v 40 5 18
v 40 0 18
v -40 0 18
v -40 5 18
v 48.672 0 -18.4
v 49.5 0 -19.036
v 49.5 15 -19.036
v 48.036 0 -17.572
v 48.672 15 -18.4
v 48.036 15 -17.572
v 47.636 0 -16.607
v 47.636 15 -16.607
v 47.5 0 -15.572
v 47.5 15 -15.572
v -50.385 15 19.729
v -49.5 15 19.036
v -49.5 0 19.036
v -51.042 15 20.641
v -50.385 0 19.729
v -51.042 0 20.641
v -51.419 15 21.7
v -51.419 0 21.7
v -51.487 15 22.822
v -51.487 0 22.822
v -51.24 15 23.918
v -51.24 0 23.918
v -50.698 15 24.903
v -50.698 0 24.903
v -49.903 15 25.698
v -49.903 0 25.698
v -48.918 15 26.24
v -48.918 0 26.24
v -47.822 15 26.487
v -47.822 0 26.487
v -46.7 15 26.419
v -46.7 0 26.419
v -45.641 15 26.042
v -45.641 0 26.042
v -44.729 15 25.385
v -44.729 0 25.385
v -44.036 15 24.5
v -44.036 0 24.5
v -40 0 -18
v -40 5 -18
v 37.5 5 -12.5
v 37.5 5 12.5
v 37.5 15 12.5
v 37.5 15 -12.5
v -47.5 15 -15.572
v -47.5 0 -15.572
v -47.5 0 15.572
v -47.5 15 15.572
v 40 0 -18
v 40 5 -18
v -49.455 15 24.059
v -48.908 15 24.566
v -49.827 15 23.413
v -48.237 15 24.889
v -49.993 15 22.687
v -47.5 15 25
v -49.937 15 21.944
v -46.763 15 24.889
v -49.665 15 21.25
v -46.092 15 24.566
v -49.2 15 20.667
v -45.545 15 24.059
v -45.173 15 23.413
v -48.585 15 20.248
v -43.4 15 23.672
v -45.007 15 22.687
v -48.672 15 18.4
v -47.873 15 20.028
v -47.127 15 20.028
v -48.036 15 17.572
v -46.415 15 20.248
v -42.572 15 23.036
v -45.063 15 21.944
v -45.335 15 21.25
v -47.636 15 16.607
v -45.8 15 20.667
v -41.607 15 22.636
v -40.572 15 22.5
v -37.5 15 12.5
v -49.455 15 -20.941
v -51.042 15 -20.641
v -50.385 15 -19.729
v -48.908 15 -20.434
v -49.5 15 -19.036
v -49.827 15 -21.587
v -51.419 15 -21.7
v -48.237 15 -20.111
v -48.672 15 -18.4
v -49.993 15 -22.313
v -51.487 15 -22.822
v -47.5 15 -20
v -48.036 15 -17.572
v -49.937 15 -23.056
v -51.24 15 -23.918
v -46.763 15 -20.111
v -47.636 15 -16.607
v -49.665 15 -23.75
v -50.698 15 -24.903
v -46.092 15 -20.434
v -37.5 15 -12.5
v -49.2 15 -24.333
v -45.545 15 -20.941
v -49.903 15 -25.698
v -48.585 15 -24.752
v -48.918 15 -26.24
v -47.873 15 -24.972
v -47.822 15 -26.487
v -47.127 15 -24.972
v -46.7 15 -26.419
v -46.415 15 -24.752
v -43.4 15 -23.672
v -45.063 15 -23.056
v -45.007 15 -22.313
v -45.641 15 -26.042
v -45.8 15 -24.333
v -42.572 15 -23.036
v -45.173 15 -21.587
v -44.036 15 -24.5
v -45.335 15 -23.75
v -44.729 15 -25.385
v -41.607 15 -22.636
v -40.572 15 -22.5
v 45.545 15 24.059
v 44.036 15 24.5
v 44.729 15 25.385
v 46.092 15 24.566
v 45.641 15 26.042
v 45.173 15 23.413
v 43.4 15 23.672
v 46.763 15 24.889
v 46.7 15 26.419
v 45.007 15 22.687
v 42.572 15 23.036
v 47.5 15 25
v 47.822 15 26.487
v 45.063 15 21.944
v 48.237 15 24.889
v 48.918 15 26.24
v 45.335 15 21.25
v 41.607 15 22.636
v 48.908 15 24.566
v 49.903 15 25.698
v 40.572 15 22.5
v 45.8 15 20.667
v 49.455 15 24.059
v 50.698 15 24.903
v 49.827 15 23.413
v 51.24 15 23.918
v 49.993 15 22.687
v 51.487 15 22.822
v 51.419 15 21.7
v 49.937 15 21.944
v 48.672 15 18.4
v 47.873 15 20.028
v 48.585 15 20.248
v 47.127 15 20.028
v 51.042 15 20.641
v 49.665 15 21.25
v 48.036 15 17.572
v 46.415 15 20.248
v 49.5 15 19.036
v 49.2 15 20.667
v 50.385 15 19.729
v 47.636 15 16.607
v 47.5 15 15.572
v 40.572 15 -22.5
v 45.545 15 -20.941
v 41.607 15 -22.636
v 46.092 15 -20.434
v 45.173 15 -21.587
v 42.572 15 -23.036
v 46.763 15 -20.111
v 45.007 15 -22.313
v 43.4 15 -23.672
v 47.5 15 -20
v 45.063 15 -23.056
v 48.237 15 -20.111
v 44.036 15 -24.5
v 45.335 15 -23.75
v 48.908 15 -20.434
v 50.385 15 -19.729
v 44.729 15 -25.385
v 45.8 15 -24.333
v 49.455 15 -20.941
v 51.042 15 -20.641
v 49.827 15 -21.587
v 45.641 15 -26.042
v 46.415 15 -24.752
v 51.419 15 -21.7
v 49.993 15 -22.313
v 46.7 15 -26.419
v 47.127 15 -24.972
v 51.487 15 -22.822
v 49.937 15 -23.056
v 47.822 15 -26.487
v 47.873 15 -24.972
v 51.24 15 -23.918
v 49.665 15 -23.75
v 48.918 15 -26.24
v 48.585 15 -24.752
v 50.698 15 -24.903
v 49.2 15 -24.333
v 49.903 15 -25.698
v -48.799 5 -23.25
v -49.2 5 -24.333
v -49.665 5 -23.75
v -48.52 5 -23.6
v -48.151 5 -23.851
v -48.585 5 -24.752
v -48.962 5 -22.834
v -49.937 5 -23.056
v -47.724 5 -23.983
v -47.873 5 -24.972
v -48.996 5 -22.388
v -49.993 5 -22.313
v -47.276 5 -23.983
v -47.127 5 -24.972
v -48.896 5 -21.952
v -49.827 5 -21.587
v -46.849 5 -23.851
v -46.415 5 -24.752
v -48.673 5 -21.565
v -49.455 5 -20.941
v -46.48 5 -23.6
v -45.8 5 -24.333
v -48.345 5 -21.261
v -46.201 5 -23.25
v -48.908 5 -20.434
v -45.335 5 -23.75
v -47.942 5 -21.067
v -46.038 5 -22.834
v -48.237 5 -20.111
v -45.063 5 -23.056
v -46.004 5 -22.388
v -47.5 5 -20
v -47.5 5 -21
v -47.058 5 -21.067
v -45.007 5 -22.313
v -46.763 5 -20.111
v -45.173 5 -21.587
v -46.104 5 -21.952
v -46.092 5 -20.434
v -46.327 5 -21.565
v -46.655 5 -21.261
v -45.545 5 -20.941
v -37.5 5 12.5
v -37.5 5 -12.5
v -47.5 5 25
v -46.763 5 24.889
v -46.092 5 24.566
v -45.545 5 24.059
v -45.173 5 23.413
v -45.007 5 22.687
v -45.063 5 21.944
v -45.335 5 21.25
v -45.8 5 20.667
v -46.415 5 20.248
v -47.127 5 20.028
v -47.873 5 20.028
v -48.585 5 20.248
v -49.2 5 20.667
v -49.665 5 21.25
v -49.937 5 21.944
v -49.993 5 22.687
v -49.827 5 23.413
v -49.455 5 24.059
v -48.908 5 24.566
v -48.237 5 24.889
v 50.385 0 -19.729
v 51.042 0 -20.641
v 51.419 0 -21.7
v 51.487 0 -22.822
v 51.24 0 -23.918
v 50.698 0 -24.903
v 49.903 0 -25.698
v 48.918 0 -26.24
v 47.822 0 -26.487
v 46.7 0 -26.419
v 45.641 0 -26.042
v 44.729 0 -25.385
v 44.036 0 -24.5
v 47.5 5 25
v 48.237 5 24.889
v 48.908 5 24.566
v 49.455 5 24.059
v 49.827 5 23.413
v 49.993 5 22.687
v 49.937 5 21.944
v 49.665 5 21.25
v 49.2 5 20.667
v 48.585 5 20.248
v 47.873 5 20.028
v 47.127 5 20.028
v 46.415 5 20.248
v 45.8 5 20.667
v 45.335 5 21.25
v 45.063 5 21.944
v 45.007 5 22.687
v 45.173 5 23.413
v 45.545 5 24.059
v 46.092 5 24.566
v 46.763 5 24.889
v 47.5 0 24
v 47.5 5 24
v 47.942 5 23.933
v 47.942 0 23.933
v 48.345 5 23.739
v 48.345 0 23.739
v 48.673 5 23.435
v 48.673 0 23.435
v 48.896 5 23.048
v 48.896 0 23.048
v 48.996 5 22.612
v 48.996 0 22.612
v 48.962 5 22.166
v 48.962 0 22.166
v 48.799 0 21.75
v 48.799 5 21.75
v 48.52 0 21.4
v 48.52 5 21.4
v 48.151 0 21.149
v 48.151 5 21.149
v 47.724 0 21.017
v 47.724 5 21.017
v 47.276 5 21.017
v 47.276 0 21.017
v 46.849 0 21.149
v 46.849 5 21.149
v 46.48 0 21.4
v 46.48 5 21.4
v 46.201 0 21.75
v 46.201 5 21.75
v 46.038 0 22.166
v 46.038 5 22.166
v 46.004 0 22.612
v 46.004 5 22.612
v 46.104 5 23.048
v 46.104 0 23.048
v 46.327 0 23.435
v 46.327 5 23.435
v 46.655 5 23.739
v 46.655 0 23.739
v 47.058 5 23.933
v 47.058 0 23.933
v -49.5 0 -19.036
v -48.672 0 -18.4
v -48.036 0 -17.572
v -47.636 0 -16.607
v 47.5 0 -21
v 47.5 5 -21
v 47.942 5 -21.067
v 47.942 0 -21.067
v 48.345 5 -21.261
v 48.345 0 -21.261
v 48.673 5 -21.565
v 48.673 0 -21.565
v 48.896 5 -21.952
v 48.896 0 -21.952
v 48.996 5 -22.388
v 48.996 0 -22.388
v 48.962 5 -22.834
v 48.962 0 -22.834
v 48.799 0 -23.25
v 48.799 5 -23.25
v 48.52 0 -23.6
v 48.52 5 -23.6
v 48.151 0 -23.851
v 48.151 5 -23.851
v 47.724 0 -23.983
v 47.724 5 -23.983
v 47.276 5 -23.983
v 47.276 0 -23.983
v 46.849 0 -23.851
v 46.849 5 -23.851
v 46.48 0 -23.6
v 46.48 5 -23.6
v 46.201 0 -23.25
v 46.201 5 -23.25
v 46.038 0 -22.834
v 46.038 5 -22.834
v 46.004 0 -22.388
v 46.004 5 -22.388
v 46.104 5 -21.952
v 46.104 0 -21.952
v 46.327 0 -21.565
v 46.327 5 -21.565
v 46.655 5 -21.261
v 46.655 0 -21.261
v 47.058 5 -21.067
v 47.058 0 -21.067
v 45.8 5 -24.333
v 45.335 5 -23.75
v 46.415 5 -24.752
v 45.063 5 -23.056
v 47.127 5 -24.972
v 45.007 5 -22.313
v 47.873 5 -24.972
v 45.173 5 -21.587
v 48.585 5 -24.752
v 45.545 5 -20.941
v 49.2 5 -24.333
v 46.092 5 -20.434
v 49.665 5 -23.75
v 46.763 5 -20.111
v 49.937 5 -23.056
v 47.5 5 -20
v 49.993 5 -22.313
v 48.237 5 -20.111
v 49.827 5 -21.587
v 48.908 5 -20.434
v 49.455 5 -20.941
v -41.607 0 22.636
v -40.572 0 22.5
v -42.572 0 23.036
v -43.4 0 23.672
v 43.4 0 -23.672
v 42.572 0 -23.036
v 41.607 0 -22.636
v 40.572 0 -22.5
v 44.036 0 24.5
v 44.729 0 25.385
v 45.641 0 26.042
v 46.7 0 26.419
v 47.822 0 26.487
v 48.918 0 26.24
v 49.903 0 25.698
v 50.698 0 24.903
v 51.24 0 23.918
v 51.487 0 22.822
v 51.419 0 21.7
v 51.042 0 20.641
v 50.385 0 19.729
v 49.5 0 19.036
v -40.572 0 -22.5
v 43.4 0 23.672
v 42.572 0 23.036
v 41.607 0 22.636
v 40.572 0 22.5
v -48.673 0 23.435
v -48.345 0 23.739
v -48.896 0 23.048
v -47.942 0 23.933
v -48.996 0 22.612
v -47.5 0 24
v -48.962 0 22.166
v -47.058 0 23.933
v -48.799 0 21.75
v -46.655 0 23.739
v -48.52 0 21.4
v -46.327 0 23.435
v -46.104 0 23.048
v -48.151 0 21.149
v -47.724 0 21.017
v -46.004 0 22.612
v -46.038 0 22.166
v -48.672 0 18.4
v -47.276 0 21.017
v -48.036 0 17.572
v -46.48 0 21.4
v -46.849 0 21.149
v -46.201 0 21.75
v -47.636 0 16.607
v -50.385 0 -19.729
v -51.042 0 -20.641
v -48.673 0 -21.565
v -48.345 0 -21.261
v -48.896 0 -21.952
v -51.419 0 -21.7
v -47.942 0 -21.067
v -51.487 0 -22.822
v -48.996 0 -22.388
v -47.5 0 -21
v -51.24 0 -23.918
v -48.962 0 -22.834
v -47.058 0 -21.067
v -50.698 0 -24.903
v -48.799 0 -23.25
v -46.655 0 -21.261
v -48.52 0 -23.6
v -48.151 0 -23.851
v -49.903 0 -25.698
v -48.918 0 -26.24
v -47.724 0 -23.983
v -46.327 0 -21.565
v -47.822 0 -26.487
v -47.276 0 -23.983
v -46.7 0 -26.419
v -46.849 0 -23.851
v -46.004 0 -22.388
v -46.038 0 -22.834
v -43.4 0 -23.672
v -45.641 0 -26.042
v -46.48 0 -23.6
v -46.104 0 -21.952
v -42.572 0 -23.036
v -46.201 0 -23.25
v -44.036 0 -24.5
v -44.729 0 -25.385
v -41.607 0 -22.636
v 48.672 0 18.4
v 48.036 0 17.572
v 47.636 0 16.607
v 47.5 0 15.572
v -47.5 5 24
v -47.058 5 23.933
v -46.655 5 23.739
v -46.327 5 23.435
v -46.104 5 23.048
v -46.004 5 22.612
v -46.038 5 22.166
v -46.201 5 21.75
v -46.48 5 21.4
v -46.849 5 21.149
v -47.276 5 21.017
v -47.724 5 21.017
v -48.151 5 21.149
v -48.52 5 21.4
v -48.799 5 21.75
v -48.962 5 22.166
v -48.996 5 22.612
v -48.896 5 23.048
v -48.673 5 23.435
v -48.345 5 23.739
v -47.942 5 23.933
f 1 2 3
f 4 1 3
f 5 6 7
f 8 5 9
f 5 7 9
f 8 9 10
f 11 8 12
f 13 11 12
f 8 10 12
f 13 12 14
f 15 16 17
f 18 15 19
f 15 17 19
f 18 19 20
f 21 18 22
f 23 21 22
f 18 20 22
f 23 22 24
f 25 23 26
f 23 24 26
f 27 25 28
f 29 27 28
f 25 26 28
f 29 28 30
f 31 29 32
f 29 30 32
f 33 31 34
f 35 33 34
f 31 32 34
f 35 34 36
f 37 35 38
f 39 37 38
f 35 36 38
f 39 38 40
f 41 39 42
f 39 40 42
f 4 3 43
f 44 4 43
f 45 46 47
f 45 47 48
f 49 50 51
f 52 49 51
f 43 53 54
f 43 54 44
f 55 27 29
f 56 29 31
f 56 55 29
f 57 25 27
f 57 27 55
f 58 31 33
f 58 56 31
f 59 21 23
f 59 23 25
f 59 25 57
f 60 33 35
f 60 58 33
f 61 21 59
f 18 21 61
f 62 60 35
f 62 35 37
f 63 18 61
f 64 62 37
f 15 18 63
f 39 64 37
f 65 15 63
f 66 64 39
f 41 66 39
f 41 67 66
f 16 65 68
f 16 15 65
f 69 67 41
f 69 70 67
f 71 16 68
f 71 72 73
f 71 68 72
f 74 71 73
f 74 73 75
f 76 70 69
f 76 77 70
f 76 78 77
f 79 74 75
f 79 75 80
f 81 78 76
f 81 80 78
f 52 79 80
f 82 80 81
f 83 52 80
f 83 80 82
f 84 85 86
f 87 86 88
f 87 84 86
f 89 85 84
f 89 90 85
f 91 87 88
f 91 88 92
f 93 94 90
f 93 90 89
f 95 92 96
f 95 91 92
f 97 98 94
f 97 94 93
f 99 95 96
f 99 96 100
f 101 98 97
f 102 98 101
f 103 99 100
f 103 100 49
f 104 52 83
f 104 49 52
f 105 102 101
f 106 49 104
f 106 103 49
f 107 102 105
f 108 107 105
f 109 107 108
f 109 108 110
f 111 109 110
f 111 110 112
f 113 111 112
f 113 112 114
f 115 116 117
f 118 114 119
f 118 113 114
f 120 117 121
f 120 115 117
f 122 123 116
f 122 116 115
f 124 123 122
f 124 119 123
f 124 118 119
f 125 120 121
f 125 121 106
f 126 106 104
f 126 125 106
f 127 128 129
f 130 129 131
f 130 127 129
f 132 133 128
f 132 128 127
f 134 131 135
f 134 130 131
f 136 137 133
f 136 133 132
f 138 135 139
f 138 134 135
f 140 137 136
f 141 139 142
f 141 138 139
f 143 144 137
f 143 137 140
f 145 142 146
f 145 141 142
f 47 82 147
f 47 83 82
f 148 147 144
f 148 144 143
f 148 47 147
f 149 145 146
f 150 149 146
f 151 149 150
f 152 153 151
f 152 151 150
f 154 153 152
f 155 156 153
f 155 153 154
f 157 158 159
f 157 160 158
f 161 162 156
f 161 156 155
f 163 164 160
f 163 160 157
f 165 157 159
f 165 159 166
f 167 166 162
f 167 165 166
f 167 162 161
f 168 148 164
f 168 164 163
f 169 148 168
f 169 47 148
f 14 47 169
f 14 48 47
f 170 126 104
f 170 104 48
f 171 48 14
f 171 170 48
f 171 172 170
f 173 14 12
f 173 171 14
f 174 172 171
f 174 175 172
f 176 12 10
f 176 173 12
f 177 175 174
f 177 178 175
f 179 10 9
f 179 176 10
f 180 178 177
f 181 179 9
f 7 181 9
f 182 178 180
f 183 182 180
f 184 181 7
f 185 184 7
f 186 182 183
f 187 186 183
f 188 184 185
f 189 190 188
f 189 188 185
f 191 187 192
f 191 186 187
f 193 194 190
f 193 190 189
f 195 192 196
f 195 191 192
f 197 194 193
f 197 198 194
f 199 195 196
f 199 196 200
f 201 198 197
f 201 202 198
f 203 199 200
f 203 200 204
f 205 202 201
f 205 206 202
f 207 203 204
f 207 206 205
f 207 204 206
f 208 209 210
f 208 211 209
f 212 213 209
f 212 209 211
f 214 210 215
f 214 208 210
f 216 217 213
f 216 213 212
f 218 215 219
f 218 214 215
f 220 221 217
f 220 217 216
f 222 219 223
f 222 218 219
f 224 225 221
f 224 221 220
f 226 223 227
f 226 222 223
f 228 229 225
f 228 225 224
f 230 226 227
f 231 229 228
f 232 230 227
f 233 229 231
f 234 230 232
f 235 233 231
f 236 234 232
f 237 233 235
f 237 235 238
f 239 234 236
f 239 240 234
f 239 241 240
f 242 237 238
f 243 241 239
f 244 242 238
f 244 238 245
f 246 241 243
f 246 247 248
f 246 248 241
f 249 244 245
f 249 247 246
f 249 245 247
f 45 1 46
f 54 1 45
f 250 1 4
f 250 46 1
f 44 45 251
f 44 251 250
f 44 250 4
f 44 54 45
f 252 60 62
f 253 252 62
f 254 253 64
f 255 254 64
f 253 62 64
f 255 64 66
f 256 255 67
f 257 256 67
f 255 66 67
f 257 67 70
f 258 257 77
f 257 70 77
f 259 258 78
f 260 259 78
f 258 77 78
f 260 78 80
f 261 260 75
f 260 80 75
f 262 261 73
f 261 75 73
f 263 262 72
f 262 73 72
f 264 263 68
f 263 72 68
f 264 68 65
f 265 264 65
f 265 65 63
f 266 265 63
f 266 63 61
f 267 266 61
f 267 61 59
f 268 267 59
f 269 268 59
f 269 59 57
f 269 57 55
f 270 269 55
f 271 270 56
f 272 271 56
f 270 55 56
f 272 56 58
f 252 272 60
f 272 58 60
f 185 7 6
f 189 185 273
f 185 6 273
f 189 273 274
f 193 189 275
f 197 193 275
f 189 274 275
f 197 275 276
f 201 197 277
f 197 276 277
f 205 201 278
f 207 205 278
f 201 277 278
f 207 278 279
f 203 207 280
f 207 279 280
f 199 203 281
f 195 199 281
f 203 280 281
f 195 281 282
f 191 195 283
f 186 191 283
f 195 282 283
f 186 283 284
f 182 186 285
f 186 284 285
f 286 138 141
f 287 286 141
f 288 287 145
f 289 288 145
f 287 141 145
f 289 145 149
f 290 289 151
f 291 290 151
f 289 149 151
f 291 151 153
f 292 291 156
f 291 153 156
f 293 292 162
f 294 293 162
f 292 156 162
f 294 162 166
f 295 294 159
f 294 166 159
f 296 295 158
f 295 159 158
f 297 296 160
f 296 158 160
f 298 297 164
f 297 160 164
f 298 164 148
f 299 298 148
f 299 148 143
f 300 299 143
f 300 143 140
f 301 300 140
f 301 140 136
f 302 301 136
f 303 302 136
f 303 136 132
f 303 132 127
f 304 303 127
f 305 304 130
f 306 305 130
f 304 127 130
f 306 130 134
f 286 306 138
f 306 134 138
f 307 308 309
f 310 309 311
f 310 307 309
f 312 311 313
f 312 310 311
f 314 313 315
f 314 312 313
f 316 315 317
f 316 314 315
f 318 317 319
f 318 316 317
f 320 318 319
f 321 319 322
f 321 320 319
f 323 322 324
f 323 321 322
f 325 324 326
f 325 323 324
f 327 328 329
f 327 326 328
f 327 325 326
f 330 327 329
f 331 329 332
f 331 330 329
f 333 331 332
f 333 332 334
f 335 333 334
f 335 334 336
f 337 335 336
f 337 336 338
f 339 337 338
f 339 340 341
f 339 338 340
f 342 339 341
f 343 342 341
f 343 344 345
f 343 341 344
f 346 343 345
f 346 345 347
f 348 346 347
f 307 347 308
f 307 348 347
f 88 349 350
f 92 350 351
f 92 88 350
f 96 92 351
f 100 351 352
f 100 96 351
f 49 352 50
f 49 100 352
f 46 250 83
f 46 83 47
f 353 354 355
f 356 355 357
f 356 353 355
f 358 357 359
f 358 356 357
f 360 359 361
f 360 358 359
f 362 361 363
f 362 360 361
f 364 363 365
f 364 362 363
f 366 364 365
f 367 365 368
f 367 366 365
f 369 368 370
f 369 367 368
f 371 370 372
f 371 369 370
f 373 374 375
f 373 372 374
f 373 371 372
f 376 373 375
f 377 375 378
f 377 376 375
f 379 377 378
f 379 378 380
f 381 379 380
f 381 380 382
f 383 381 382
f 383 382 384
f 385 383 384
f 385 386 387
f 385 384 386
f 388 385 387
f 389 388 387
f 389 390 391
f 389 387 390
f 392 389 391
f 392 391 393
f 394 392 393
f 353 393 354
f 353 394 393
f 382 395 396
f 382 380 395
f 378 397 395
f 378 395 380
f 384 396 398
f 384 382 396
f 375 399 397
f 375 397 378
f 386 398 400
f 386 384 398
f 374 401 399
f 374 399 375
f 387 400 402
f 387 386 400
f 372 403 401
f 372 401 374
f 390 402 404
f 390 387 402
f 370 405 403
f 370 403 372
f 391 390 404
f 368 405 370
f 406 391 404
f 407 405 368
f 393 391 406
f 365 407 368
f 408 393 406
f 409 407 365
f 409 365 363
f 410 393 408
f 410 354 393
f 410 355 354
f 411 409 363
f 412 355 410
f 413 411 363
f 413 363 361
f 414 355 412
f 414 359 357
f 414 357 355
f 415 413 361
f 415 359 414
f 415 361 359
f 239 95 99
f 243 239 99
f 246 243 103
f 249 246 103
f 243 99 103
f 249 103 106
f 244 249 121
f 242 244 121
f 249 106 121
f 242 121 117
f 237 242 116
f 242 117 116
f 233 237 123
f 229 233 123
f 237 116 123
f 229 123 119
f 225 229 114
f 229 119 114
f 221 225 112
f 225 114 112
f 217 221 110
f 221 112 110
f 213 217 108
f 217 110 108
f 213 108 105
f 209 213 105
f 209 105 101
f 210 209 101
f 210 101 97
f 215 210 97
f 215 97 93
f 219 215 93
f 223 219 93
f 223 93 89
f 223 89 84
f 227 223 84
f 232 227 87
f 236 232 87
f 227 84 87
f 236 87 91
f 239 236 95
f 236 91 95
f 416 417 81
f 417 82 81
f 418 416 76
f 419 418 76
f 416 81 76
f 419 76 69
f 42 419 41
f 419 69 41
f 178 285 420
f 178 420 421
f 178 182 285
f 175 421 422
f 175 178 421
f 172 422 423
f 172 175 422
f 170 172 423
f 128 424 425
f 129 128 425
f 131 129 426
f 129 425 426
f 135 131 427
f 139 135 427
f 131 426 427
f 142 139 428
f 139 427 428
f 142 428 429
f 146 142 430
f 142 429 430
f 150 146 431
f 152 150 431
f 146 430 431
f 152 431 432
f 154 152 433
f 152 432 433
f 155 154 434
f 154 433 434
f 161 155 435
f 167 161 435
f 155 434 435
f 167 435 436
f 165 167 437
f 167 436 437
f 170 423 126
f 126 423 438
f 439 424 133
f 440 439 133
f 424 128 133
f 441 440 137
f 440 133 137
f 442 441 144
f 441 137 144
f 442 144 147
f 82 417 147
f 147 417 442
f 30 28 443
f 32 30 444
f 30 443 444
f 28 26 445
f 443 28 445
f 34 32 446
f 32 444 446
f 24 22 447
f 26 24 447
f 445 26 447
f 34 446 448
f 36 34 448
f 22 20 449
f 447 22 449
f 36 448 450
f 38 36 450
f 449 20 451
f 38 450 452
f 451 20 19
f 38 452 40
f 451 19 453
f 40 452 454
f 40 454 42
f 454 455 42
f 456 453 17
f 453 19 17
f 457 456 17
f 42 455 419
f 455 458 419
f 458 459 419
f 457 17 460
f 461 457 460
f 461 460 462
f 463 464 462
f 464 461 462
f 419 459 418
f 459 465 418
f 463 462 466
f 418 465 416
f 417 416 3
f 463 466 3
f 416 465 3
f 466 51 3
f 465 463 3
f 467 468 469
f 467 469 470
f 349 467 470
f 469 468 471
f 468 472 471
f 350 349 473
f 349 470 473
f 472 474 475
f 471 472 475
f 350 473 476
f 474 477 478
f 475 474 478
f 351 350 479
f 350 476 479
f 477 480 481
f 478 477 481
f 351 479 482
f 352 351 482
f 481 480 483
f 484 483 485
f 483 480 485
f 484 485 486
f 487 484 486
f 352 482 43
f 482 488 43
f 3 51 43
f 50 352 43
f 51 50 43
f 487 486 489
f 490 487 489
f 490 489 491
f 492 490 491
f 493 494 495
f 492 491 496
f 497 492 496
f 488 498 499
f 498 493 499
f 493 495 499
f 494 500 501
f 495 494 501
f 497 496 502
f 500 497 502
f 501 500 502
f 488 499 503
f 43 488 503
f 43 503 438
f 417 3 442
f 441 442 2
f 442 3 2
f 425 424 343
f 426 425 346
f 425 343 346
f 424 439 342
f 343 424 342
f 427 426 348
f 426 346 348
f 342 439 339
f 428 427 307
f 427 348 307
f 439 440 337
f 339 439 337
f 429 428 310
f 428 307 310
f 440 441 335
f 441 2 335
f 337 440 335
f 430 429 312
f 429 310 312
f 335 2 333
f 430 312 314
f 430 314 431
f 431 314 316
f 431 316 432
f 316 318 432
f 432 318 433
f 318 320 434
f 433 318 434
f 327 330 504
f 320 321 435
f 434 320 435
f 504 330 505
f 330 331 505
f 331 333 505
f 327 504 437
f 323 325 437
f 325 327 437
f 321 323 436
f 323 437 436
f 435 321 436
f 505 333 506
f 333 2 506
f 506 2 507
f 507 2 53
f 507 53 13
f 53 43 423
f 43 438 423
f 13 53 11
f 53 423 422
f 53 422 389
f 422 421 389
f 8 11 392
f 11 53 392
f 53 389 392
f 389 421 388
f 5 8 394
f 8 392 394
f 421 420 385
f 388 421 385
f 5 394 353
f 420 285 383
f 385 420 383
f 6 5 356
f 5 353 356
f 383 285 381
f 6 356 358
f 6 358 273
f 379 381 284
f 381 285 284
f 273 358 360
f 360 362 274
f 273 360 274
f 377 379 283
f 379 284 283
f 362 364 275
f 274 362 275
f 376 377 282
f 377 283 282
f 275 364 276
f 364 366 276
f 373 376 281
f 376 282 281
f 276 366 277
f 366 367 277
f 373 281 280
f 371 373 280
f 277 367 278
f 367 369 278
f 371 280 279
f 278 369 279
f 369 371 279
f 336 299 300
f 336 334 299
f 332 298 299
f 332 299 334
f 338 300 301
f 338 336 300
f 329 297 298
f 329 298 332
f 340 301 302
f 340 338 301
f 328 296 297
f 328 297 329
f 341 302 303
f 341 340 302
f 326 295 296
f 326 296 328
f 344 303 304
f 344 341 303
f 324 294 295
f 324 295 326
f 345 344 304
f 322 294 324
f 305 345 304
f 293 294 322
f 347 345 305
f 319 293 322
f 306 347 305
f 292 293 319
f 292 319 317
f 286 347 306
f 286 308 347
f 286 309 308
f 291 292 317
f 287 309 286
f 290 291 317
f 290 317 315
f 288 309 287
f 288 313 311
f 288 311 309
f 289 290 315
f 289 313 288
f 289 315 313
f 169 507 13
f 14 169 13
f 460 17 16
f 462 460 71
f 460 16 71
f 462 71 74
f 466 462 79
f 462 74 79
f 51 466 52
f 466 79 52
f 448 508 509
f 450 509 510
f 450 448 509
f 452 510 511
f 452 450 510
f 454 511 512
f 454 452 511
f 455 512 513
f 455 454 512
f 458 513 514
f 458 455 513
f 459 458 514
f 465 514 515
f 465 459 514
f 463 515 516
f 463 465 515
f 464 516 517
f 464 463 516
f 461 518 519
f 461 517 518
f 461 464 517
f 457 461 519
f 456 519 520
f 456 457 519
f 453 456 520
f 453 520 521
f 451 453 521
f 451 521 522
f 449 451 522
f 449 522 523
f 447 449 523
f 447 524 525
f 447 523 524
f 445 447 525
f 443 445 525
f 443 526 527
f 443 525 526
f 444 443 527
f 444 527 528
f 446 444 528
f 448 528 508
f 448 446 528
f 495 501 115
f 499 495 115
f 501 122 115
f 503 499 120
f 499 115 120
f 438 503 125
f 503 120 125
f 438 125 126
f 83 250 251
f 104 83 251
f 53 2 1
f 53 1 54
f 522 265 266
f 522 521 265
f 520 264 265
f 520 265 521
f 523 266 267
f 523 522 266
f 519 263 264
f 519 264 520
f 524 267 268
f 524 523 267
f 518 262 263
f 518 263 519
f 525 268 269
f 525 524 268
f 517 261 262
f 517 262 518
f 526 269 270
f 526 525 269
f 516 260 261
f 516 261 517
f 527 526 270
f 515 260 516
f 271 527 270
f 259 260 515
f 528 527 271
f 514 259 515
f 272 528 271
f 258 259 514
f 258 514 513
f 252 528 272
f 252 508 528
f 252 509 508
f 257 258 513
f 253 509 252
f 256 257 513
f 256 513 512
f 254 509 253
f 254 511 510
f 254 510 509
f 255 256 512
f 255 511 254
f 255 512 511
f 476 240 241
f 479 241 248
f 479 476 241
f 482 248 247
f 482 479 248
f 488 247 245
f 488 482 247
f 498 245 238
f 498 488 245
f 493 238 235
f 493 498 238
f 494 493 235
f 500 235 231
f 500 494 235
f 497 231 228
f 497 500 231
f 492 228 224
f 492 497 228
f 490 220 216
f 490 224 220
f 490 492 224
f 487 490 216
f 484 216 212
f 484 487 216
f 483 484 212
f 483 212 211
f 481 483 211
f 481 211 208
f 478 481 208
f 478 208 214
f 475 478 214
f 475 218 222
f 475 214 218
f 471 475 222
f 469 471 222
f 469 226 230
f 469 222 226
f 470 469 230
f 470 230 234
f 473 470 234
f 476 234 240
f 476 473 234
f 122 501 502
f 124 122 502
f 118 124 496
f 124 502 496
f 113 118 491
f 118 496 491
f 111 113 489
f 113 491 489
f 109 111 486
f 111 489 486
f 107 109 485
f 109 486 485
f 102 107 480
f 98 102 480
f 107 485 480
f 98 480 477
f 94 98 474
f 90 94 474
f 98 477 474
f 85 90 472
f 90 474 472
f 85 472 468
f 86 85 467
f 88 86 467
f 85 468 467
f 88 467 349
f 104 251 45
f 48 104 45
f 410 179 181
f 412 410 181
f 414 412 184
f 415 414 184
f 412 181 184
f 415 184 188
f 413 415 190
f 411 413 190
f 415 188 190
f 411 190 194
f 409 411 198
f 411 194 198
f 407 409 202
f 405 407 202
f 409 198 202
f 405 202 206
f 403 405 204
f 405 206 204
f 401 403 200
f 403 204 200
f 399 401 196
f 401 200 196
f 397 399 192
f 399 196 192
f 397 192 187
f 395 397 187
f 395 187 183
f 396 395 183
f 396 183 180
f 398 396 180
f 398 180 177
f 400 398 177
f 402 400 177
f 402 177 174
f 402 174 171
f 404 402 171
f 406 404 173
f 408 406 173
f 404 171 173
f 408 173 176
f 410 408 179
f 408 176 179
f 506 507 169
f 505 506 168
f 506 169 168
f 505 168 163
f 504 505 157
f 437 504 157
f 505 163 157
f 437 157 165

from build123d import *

# Parameters (mm, degrees)
SKETCH2_R           = 1.5
SKETCH2_W           = 75
SKETCH2_H           = 25
BOSS_EXTRUDE1_DEPTH = 15
FILLET3_R           = 4
FILLET4_R           = 4
FILLET5_R           = 4
FILLET6_R           = 4
FILLET7_R           = 4
FILLET8_R           = 4
FILLET9_R           = 4
FILLET10_R          = 4
SKETCH3_R           = 2.5
CUT_EXTRUDE1_DEPTH  = 10
SKETCH5_W           = 80
SKETCH5_H           = 36
CUT_EXTRUDE2_DEPTH  = 5


with BuildPart() as part:
    # Sketch2 → Boss-Extrude1 (new body)
    with BuildSketch(Plane(origin=(0, 0, 0), x_dir=(1, 0, 0), z_dir=(0, 1, 0))):
        with BuildLine():
            ThreePointArc((-43.5, 22.5), (-50.328427125, 25.328427125), (-47.5, 18.5))
            Line((-47.5, 18.5), (-47.5, -18.5))
            ThreePointArc((-47.5, -18.5), (-50.328427125, -25.328427125), (-43.5, -22.5))
            Line((-43.5, -22.5), (43.5, -22.5))
            ThreePointArc((43.5, -22.5), (50.328427125, -25.328427125), (47.5, -18.5))
            Line((47.5, -18.5), (47.5, 18.5))
            ThreePointArc((47.5, 18.5), (50.328427125, 25.328427125), (43.5, 22.5))
            Line((43.5, 22.5), (-43.5, 22.5))
        make_face()
        with Locations(Location((-47.5, 22.5, 0), (0, 0, 270))):
            Circle(SKETCH2_R, mode=Mode.SUBTRACT)
        with Locations(Location((-47.5, -22.5, 0), (0, 0, 270))):
            Circle(SKETCH2_R, mode=Mode.SUBTRACT)
        Rectangle(SKETCH2_W, SKETCH2_H, mode=Mode.SUBTRACT)
        with Locations(Location((47.5, 22.5, 0), (0, 0, 270))):
            Circle(SKETCH2_R, mode=Mode.SUBTRACT)
        with Locations(Location((47.5, -22.5, 0), (0, 0, 270))):
            Circle(SKETCH2_R, mode=Mode.SUBTRACT)
    extrude(amount=BOSS_EXTRUDE1_DEPTH)

    # Fillet3
    fillet3_edges = [part.edges().sort_by_distance(p)[0] for p in [
        (-43.5, 7.5, -22.5),
    ]]
    fillet(fillet3_edges, radius=FILLET3_R)

    # Fillet4
    fillet4_edges = [part.edges().sort_by_distance(p)[0] for p in [
        (-47.5, 7.5, -18.5),
    ]]
    fillet(fillet4_edges, radius=FILLET4_R)

    # Fillet5
    fillet5_edges = [part.edges().sort_by_distance(p)[0] for p in [
        (47.5, 7.5, -18.5),
    ]]
    fillet(fillet5_edges, radius=FILLET5_R)

    # Fillet6
    fillet6_edges = [part.edges().sort_by_distance(p)[0] for p in [
        (43.5, 7.5, -22.5),
    ]]
    fillet(fillet6_edges, radius=FILLET6_R)

    # Fillet7
    fillet7_edges = [part.edges().sort_by_distance(p)[0] for p in [
        (47.5, 7.5, 18.5),
    ]]
    fillet(fillet7_edges, radius=FILLET7_R)

    # Fillet8
    fillet8_edges = [part.edges().sort_by_distance(p)[0] for p in [
        (43.5, 7.5, 22.5),
    ]]
    fillet(fillet8_edges, radius=FILLET8_R)

    # Fillet9
    fillet9_edges = [part.edges().sort_by_distance(p)[0] for p in [
        (-43.5, 7.5, 22.5),
    ]]
    fillet(fillet9_edges, radius=FILLET9_R)

    # Fillet10
    fillet10_edges = [part.edges().sort_by_distance(p)[0] for p in [
        (-47.5, 7.5, 18.5),
    ]]
    fillet(fillet10_edges, radius=FILLET10_R)

    # Sketch3 → Cut-Extrude1 (cut)
    with BuildSketch(Plane(origin=(0, 15, 0), x_dir=(1, 0, 0), z_dir=(0, 1, 0))):
        with Locations(Location((-47.5, 22.5, 0), (0, 0, 270))):
            Circle(SKETCH3_R)
        with Locations(Location((47.5, 22.5, 0), (0, 0, 270))):
            Circle(SKETCH3_R)
        with Locations(Location((47.5, -22.5, 0), (0, 0, 270))):
            Circle(SKETCH3_R)
        with Locations(Location((-47.5, -22.5, 0), (0, 0, 270))):
            Circle(SKETCH3_R)
    extrude(amount=-CUT_EXTRUDE1_DEPTH, mode=Mode.SUBTRACT)

    # Sketch5 → Cut-Extrude2 (cut)
    with BuildSketch(Plane(origin=(0, 0, 0), x_dir=(-1, 0, 0), z_dir=(0, -1, 0))):
        Rectangle(SKETCH5_W, SKETCH5_H)
    extrude(amount=-CUT_EXTRUDE2_DEPTH, mode=Mode.SUBTRACT)


solid = part.part
